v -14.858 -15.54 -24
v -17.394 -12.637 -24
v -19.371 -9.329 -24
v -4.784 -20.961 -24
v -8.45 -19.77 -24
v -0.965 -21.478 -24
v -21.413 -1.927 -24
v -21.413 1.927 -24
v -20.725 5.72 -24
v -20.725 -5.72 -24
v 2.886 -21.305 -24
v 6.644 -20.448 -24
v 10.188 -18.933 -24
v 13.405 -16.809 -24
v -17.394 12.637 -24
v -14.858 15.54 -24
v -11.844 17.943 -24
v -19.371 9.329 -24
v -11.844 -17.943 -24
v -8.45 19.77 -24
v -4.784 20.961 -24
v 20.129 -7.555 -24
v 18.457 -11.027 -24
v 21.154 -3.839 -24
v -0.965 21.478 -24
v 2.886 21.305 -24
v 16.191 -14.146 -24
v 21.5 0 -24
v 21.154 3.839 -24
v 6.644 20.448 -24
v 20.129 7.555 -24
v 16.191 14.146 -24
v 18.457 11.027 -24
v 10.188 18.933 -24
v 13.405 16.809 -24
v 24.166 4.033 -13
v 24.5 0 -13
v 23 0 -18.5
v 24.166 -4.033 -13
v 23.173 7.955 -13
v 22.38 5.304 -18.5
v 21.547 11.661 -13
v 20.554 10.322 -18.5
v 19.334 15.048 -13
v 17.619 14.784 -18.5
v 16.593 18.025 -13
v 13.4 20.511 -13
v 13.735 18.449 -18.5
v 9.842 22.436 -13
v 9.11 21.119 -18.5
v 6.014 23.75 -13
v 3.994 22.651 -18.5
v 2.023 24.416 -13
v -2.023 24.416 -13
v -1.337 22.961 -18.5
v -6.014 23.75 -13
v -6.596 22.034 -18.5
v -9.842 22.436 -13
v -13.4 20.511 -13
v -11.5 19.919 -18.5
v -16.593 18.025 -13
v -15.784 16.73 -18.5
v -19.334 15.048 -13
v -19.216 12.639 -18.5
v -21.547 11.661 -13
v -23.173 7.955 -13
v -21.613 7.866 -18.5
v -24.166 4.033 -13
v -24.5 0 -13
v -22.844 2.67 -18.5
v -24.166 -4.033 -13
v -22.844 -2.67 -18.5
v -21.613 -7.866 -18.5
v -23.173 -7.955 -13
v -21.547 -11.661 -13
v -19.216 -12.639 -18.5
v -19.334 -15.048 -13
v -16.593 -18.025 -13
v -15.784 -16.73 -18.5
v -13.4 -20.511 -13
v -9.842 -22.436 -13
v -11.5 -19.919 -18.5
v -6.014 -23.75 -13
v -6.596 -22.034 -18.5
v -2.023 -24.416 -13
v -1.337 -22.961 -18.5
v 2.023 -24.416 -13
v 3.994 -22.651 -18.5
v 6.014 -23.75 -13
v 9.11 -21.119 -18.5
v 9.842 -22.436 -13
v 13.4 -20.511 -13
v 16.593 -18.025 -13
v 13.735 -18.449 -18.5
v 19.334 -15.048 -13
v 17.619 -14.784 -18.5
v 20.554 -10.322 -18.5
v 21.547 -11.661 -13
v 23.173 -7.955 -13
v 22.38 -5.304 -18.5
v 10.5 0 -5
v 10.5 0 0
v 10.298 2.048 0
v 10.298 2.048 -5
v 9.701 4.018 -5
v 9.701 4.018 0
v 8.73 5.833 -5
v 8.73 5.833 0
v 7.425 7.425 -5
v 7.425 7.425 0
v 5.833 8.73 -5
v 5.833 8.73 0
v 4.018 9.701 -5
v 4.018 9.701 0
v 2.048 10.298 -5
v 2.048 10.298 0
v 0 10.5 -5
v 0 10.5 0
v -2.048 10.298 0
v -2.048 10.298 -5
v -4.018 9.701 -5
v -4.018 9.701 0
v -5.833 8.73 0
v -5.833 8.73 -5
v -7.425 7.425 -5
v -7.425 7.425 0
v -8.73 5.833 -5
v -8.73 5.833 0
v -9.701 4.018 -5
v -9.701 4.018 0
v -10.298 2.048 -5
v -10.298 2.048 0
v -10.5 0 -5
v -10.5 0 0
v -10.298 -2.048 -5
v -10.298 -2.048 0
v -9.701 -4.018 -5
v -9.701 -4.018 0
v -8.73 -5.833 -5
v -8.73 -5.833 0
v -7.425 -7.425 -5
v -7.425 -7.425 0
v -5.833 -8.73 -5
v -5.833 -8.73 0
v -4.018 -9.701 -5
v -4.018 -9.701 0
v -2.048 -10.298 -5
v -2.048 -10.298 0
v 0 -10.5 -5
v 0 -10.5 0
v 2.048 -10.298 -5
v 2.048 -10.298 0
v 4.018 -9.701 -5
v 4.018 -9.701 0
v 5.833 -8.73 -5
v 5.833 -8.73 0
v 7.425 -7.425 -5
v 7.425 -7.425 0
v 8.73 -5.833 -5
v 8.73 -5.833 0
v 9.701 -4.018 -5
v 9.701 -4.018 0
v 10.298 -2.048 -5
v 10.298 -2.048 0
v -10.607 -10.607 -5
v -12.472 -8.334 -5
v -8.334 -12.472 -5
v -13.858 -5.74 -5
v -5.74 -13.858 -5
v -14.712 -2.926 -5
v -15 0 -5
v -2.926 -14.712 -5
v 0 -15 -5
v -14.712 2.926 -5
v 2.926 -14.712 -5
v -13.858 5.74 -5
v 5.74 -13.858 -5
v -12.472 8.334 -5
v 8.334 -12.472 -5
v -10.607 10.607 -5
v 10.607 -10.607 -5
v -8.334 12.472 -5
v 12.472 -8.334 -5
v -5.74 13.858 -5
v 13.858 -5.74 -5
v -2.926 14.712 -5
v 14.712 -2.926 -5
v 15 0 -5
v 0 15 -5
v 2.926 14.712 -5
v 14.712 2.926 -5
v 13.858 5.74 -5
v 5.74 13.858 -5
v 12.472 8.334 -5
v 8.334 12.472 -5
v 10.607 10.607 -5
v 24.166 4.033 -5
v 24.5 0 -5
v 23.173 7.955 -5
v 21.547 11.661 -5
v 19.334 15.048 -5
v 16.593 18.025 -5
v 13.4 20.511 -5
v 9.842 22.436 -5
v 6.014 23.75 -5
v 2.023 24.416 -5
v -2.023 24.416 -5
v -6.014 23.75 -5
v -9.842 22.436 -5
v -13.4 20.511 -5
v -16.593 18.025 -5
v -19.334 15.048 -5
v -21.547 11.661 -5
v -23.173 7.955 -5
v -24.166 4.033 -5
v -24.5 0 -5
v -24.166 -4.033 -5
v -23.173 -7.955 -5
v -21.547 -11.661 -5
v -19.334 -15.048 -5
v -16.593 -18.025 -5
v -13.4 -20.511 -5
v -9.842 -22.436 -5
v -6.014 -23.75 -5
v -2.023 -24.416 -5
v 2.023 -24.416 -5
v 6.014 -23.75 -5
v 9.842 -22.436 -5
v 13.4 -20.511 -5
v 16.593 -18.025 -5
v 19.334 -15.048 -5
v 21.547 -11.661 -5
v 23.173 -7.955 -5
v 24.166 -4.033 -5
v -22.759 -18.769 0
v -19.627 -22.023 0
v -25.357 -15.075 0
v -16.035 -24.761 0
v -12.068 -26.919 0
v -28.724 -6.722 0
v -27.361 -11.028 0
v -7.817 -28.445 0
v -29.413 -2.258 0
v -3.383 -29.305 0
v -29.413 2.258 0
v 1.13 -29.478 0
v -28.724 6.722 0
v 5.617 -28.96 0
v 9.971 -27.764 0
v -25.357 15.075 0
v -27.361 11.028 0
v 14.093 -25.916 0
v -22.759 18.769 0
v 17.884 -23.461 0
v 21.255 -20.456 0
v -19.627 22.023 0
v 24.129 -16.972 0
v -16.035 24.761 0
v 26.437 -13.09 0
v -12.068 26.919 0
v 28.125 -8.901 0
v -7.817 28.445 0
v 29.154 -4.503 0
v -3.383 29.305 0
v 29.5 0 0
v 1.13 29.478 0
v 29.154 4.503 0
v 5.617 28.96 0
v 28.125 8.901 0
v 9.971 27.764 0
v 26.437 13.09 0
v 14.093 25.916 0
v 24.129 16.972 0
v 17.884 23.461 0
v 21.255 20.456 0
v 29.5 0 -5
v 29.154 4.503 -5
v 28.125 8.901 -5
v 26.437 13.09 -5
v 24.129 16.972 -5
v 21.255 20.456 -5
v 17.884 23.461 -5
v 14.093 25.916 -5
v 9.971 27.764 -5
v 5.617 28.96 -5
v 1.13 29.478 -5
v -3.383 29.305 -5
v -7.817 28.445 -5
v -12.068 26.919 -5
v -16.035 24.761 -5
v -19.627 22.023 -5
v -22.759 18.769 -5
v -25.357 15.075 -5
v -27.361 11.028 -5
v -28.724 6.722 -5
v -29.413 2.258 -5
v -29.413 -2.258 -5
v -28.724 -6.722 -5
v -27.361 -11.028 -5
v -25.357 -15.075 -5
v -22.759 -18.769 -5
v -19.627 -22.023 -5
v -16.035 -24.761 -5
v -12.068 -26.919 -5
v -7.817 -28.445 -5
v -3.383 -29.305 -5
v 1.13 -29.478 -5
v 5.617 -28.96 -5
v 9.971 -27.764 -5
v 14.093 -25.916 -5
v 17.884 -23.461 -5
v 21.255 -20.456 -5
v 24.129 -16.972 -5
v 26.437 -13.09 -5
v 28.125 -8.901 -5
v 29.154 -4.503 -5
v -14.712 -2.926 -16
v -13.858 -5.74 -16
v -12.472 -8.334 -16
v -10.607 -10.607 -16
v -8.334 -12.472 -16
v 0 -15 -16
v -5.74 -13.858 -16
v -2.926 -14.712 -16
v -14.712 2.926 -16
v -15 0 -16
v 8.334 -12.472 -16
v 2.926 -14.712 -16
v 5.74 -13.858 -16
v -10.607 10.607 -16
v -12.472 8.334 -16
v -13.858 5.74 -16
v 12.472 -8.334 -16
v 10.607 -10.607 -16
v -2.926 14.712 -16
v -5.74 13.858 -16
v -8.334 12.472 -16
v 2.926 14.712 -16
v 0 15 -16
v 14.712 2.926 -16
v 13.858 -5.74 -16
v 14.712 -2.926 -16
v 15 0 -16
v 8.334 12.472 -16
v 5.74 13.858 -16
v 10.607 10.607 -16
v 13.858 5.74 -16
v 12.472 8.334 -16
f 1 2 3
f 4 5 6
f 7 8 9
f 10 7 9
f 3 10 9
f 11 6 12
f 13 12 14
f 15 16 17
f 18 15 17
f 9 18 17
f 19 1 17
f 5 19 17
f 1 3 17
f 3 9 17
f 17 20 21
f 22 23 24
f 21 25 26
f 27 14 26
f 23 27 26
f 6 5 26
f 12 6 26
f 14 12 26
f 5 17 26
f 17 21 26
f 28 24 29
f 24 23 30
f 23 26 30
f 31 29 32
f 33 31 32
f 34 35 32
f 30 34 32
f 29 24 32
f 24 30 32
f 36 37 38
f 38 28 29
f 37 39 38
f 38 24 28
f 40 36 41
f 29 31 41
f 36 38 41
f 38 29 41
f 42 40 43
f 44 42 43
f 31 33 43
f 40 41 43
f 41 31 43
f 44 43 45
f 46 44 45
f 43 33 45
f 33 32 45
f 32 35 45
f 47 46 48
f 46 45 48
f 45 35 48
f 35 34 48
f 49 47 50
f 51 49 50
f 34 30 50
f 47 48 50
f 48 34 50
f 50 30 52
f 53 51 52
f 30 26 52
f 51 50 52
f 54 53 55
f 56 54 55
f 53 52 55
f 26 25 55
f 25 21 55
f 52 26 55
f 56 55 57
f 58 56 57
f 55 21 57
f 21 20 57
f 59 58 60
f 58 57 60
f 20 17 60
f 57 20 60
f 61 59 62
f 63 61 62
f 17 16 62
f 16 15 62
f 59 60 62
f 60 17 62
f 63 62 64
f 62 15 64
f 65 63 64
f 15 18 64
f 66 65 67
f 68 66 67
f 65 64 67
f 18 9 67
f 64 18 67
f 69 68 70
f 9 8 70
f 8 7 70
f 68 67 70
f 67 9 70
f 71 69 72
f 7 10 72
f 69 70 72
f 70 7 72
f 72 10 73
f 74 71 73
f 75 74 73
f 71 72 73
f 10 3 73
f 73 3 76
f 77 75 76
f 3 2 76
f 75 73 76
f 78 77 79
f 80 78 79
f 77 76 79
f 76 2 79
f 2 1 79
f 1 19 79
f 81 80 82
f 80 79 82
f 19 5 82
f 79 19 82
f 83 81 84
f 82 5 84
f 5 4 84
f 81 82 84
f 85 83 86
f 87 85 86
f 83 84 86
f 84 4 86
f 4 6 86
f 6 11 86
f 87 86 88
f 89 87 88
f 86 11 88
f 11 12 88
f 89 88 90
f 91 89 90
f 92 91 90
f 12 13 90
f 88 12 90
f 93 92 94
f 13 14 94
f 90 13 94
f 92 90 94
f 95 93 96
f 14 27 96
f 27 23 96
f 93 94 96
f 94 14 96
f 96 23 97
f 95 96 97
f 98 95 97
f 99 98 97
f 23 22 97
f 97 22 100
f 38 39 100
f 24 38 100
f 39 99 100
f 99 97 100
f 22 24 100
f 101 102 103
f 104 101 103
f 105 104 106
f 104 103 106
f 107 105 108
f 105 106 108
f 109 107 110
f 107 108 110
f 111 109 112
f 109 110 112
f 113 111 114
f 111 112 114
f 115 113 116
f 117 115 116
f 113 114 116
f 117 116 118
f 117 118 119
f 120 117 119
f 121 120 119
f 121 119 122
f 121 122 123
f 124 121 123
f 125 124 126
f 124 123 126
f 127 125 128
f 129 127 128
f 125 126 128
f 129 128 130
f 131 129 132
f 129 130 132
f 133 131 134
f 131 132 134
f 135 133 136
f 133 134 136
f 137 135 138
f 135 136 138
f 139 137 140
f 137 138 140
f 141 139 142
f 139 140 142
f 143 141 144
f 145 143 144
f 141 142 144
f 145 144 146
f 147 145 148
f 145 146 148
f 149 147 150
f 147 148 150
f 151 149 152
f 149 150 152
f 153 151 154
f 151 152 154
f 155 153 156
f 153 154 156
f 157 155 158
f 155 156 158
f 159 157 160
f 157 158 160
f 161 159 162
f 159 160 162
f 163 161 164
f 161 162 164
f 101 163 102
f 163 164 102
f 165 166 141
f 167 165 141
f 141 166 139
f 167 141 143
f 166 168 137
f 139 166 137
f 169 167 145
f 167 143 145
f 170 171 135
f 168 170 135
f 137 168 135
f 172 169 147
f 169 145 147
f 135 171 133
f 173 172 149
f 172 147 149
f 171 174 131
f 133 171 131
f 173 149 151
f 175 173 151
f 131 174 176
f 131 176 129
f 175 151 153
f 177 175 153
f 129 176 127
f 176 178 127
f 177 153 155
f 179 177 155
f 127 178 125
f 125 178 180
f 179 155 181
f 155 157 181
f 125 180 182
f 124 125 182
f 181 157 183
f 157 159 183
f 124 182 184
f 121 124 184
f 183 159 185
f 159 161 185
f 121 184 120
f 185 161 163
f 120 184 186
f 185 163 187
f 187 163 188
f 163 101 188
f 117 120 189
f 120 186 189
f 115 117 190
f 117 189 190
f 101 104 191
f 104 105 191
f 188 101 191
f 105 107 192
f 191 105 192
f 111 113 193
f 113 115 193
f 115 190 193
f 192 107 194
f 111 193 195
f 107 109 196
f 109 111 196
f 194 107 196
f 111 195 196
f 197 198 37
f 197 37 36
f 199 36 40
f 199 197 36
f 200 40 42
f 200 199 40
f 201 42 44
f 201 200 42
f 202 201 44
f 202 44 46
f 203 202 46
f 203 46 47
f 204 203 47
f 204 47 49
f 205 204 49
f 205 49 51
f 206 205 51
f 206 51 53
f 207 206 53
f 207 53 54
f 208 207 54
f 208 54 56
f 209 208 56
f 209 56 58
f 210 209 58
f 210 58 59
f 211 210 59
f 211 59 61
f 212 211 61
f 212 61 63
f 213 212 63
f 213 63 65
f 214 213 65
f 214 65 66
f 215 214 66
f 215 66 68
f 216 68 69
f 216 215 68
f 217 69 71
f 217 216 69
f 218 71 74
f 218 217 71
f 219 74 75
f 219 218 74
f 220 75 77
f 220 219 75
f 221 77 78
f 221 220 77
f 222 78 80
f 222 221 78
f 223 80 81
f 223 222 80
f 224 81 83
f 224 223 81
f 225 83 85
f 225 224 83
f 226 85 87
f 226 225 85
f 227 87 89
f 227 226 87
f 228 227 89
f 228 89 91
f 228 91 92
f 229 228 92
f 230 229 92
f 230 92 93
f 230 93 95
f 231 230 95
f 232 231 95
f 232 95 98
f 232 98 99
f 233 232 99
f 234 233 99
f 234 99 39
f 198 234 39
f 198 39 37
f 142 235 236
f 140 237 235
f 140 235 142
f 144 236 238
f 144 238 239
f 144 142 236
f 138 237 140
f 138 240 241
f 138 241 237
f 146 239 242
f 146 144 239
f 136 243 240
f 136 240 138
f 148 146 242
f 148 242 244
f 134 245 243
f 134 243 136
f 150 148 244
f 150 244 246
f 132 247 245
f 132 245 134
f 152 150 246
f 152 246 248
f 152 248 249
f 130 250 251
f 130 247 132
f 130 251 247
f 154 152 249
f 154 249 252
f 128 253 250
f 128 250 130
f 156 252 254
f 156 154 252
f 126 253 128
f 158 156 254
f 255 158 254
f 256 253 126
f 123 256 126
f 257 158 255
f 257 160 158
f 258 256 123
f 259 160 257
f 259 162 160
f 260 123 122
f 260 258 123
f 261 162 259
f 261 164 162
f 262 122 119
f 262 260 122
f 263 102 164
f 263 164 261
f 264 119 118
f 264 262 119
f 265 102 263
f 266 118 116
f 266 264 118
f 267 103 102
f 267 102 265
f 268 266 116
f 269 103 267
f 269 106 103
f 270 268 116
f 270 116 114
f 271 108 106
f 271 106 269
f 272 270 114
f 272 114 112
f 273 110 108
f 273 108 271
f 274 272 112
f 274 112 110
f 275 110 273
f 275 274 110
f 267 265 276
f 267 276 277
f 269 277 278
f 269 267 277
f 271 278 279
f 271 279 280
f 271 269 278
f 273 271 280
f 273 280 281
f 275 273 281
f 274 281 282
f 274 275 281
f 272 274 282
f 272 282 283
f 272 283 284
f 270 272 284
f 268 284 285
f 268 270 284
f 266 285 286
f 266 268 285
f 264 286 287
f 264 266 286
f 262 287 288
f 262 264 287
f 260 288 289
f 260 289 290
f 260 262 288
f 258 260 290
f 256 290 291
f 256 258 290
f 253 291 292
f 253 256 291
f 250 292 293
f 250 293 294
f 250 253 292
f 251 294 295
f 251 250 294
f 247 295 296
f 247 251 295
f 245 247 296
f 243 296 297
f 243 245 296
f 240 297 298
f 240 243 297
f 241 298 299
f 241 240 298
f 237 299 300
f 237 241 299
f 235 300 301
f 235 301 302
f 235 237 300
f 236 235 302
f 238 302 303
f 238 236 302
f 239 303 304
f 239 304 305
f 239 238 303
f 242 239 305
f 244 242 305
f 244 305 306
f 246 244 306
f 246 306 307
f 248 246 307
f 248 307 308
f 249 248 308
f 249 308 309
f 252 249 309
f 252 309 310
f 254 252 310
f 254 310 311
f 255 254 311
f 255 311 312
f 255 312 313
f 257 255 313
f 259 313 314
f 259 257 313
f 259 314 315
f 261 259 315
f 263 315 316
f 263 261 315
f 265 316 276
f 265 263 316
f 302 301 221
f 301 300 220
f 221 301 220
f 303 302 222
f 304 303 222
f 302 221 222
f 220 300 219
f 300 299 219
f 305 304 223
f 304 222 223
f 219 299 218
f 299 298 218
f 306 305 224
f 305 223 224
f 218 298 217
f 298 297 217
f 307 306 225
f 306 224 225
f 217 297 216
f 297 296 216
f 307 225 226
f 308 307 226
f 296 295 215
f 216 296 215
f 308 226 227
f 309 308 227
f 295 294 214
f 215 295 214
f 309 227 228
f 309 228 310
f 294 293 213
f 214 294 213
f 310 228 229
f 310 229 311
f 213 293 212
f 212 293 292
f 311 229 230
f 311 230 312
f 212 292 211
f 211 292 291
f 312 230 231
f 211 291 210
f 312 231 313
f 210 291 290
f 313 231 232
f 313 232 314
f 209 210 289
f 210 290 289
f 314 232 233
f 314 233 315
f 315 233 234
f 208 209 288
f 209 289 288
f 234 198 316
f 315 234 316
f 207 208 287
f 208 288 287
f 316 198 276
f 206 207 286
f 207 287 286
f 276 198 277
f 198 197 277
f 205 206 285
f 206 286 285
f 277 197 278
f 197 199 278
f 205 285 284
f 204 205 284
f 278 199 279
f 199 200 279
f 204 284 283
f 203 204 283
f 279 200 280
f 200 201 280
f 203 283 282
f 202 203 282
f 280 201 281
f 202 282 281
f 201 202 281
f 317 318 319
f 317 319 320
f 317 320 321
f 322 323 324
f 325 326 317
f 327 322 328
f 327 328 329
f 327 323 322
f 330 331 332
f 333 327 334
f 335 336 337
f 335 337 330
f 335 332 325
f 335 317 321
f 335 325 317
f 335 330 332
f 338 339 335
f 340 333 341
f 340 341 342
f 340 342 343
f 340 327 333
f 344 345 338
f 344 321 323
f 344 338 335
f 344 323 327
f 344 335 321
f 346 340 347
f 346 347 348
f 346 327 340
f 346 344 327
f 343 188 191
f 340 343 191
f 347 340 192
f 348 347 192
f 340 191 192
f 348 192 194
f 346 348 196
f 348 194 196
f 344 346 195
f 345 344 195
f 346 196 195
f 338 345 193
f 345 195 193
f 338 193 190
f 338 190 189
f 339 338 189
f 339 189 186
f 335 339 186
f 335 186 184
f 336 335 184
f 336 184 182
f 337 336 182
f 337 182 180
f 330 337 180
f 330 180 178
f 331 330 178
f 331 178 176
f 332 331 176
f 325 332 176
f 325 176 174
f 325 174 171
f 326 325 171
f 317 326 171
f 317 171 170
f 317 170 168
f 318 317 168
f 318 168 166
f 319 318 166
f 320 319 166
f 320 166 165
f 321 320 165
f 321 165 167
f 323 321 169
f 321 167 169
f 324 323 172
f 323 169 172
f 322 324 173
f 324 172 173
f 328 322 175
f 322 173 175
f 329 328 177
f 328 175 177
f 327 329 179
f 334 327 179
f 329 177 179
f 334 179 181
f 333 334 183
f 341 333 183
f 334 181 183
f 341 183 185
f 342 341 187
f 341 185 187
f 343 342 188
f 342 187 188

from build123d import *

# Parameters (mm, degrees)
F0_R     = 24.5
F0_R_2   = 15
F0_R_3   = 10.5
F1_DEPTH = 24
F2_SIZE2 = 3
F2_SIZE  = 11
F0_R_4   = 29.5
F3_DEPTH = 16
F4_DEPTH = 5
F5_DEPTH = 5


# Not quite as in the source:
# - a feature names something its author has since deleted; it is built from what else it names


with BuildPart() as f1:
    # F0 (on Top) → F1 (new body)
    with BuildSketch(Plane.XY):
        Circle(F0_R)
        Circle(F0_R_2, mode=Mode.SUBTRACT)
        Circle(F0_R_2)
        Circle(F0_R_3, mode=Mode.SUBTRACT)
        Circle(F0_R_3)
    extrude(amount=-F1_DEPTH)

    # F2
    f2_edges = [f1.edges().sort_by_distance(p)[0] for p in [
        (-24.5, 0, -24),
    ]]
    f2_side = f1.faces().sort_by_distance((-24.5, 0, -12))[0]
    chamfer(f2_edges, length=F2_SIZE, length2=F2_SIZE2, reference=f2_side)

    # F0 (on Top) → F3 (cut)
    with BuildSketch(Plane.XY):
        Circle(F0_R_4)
        Circle(F0_R, mode=Mode.SUBTRACT)
        Circle(F0_R_2)
        Circle(F0_R_3, mode=Mode.SUBTRACT)
        Circle(F0_R_3)
    extrude(amount=-F3_DEPTH, mode=Mode.SUBTRACT)

    # F0 (on Top) → F4 (join)
    with BuildSketch(Plane.XY):
        Circle(F0_R_2)
        Circle(F0_R_3, mode=Mode.SUBTRACT)
    extrude(amount=-F4_DEPTH)

    # F0 (on Top) → F5 (join)
    with BuildSketch(Plane.XY):
        Circle(F0_R_4)
        Circle(F0_R, mode=Mode.SUBTRACT)
    extrude(amount=-F5_DEPTH)


solid = f1.part
